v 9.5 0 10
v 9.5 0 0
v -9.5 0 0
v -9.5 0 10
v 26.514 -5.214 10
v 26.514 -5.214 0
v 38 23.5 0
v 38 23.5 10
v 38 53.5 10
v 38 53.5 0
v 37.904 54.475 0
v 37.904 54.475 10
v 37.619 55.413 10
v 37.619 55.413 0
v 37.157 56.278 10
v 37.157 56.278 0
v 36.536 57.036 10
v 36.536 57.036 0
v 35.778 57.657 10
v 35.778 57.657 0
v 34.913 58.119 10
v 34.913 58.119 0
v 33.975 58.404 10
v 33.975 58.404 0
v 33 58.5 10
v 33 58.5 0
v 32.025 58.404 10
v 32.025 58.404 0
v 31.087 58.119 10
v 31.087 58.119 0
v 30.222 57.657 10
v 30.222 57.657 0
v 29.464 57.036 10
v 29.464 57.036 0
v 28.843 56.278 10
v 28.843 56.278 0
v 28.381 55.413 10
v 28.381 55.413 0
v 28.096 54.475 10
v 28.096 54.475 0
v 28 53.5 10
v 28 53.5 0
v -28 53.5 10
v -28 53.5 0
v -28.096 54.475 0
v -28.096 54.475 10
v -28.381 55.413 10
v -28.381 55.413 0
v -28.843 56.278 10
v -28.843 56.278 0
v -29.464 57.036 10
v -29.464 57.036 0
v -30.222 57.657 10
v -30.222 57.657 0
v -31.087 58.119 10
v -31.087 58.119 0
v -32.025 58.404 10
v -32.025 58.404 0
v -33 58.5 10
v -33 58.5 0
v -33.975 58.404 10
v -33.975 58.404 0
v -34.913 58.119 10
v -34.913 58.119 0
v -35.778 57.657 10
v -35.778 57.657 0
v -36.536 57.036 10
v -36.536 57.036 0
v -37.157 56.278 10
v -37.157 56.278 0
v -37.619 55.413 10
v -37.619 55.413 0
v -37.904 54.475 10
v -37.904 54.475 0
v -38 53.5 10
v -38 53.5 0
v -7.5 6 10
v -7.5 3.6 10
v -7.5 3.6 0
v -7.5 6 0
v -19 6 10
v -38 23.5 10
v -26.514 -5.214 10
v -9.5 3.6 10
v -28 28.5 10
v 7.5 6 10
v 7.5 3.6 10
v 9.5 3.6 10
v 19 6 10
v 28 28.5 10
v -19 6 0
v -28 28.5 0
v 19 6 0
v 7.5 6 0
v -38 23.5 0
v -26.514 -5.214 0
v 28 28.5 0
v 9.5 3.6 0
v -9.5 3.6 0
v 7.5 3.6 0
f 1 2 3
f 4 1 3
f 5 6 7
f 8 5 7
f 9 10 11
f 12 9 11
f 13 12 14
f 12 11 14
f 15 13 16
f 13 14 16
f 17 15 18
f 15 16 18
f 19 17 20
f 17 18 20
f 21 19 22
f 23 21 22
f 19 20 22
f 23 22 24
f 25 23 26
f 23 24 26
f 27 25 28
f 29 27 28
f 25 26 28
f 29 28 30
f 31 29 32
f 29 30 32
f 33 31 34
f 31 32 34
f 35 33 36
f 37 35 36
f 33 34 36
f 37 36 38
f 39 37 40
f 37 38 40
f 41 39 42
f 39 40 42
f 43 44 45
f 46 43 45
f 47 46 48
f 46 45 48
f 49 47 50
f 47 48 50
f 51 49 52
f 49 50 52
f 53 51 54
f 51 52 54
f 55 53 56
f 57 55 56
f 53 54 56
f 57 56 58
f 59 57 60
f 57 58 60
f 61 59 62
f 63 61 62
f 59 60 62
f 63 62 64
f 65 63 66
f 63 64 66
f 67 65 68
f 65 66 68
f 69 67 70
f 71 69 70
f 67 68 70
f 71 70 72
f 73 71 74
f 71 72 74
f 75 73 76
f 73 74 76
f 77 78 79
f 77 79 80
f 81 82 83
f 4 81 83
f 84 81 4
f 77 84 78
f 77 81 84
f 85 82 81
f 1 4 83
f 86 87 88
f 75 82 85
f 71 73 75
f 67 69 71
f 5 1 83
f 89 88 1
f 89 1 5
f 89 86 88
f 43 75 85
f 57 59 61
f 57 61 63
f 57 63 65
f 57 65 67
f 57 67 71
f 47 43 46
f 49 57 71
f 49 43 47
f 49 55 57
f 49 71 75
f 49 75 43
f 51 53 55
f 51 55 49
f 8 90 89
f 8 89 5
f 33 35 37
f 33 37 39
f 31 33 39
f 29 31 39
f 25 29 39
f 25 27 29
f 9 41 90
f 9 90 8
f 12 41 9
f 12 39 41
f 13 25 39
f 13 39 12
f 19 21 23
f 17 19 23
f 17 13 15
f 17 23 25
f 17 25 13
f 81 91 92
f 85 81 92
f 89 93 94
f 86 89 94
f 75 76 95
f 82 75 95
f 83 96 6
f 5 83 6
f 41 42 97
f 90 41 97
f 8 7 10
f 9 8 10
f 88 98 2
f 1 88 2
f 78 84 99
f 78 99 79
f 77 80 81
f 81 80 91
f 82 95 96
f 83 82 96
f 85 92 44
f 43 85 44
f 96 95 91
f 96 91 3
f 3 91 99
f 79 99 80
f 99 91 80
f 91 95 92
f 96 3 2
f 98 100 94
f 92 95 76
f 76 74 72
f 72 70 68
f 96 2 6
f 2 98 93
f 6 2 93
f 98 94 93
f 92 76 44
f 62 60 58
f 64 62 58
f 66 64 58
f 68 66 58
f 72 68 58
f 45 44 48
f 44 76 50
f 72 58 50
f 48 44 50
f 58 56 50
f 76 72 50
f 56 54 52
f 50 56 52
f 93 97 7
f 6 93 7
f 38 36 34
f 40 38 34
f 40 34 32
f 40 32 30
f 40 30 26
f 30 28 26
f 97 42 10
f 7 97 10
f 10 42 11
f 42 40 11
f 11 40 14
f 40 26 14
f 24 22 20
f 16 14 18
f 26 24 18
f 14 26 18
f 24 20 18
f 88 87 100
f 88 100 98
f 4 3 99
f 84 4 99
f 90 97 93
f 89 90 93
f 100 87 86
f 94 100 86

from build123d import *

# Parameters (mm, degrees)
F0_W     = 2
F0_H     = 2.4
F1_DEPTH = 10
F2_DEPTH = 10


with BuildPart() as f1:
    # F0 (on Top) → F1 (new body)
    with BuildSketch(Plane.XY):
        with Locations((-8.5, 4.8)):
            Rectangle(F0_W, F0_H)
        Polygon((-11.5, 0), (-9.5, 0), (-9.5, 3.6), (-9.5, 6), (-11.5, 6), align=None)
        Polygon((9.5, 0), (0, 0), (0, -1.5), (11.5, -1.5), (11.5, 0), align=None)
        with Locations((8.5, 4.8)):
            Rectangle(F0_W, F0_H)
        Polygon((0, -1.5), (0, 0), (-9.5, 0), (-11.5, 0), (-11.5, -1.5), align=None)
        Polygon((9.5, 3.6), (9.5, 0), (11.5, 0), (11.5, 6), (9.5, 6), align=None)
    extrude(amount=F1_DEPTH)

    # F0 (on Top) → F2 (join)
    with BuildSketch(Plane.XY):
        Polygon((-11.5, -1.5), (-11.5, 0), (-11.5, 6), (-19, 6), (-16, -1.5), align=None)
        with BuildLine():
            Line((-31, 6), (-28, 6))
            Line((-28, 6), (-28, 28.5))
            Line((-28, 28.5), (-28, 53.5))
            ThreePointArc((-28, 53.5), (-33, 58.5), (-38, 53.5))
            Line((-38, 53.5), (-38, 23.5))
            Line((-38, 23.5), (-31, 6))
        make_face()
        Polygon((11.5, 0), (11.5, -1.5), (16, -1.5), (19, 6), (11.5, 6), align=None)
        with BuildLine():
            Line((28, 6), (31, 6))
            Line((31, 6), (38, 23.5))
            Line((38, 23.5), (38, 53.5))
            ThreePointArc((38, 53.5), (33, 58.5), (28, 53.5))
            Line((28, 53.5), (28, 28.5))
            Line((28, 28.5), (28, 6))
        make_face()
        Polygon((-28, 6), (-19, 6), (-28, 28.5), align=None)
        Polygon((-28, -1.5), (-16, -1.5), (-19, 6), (-28, 6), (-31, 6), align=None)
        Polygon((19, 6), (16, -1.5), (28, -1.5), (31, 6), (28, 6), align=None)
        Polygon((28, 28.5), (19, 6), (28, 6), align=None)
        Polygon((11.5, -1.5), (0, -1.5), (-11.5, -1.5), (-16, -1.5), (-28, -1.5), (-26.5144372946, -5.2139067635), (26.5144372946, -5.2139067635), (28, -1.5), (16, -1.5), align=None)
    extrude(amount=F2_DEPTH)


solid = f1.part
